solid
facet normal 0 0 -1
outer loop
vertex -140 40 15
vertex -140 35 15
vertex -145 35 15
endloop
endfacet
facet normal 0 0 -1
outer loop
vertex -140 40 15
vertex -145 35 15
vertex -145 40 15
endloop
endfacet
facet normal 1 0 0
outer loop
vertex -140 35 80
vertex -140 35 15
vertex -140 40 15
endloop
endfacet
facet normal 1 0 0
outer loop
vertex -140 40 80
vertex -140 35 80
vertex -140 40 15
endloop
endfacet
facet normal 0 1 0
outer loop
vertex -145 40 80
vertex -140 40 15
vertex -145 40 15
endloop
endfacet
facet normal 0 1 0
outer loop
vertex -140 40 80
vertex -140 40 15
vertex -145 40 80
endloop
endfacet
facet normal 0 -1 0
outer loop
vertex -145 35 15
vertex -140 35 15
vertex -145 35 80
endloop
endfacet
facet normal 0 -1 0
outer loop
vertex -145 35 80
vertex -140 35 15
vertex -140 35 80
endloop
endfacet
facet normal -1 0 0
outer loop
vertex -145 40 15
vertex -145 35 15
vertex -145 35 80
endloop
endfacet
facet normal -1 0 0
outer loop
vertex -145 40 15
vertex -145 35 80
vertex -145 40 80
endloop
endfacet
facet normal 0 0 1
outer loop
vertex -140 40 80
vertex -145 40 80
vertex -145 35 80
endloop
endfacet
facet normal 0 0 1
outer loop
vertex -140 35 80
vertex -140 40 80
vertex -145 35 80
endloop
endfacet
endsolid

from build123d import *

# Parameters (mm, degrees)
RECTANGLE071_W   = 5
RECTANGLE071_H   = 10
EXTRUDE085_DEPTH = 5
RECTANGLE034_W   = 5
RECTANGLE034_H   = 75
EXTRUDE040_DEPTH = 5


with BuildPart() as extrude085:
    # Rectangle071 → Extrude085 (new body)
    with BuildSketch(Plane(origin=(-245, 40, 80), x_dir=(0, -1, 0), z_dir=(-1, 0, 0))):
        with Locations((2.5, 5)):
            Rectangle(RECTANGLE071_W, RECTANGLE071_H)
    extrude(amount=-EXTRUDE085_DEPTH)


with BuildPart() as extrude085_1:
    # Extrude085 placement: moved
    add(extrude085.part.moved(Location((100, 0, 0))))


with BuildPart() as cut005:
    # Rectangle034 → Extrude040 (new body)
    with BuildSketch(Plane(origin=(-140, 35, 15), x_dir=(0, 1, 0), z_dir=(1, 0, 0))):
        with Locations((2.5, 37.5)):
            Rectangle(RECTANGLE034_W, RECTANGLE034_H)
    extrude(amount=-EXTRUDE040_DEPTH)

    # Cut005: cut Extrude085
    add(extrude085_1.part, mode=Mode.SUBTRACT)


solid = cut005.part
